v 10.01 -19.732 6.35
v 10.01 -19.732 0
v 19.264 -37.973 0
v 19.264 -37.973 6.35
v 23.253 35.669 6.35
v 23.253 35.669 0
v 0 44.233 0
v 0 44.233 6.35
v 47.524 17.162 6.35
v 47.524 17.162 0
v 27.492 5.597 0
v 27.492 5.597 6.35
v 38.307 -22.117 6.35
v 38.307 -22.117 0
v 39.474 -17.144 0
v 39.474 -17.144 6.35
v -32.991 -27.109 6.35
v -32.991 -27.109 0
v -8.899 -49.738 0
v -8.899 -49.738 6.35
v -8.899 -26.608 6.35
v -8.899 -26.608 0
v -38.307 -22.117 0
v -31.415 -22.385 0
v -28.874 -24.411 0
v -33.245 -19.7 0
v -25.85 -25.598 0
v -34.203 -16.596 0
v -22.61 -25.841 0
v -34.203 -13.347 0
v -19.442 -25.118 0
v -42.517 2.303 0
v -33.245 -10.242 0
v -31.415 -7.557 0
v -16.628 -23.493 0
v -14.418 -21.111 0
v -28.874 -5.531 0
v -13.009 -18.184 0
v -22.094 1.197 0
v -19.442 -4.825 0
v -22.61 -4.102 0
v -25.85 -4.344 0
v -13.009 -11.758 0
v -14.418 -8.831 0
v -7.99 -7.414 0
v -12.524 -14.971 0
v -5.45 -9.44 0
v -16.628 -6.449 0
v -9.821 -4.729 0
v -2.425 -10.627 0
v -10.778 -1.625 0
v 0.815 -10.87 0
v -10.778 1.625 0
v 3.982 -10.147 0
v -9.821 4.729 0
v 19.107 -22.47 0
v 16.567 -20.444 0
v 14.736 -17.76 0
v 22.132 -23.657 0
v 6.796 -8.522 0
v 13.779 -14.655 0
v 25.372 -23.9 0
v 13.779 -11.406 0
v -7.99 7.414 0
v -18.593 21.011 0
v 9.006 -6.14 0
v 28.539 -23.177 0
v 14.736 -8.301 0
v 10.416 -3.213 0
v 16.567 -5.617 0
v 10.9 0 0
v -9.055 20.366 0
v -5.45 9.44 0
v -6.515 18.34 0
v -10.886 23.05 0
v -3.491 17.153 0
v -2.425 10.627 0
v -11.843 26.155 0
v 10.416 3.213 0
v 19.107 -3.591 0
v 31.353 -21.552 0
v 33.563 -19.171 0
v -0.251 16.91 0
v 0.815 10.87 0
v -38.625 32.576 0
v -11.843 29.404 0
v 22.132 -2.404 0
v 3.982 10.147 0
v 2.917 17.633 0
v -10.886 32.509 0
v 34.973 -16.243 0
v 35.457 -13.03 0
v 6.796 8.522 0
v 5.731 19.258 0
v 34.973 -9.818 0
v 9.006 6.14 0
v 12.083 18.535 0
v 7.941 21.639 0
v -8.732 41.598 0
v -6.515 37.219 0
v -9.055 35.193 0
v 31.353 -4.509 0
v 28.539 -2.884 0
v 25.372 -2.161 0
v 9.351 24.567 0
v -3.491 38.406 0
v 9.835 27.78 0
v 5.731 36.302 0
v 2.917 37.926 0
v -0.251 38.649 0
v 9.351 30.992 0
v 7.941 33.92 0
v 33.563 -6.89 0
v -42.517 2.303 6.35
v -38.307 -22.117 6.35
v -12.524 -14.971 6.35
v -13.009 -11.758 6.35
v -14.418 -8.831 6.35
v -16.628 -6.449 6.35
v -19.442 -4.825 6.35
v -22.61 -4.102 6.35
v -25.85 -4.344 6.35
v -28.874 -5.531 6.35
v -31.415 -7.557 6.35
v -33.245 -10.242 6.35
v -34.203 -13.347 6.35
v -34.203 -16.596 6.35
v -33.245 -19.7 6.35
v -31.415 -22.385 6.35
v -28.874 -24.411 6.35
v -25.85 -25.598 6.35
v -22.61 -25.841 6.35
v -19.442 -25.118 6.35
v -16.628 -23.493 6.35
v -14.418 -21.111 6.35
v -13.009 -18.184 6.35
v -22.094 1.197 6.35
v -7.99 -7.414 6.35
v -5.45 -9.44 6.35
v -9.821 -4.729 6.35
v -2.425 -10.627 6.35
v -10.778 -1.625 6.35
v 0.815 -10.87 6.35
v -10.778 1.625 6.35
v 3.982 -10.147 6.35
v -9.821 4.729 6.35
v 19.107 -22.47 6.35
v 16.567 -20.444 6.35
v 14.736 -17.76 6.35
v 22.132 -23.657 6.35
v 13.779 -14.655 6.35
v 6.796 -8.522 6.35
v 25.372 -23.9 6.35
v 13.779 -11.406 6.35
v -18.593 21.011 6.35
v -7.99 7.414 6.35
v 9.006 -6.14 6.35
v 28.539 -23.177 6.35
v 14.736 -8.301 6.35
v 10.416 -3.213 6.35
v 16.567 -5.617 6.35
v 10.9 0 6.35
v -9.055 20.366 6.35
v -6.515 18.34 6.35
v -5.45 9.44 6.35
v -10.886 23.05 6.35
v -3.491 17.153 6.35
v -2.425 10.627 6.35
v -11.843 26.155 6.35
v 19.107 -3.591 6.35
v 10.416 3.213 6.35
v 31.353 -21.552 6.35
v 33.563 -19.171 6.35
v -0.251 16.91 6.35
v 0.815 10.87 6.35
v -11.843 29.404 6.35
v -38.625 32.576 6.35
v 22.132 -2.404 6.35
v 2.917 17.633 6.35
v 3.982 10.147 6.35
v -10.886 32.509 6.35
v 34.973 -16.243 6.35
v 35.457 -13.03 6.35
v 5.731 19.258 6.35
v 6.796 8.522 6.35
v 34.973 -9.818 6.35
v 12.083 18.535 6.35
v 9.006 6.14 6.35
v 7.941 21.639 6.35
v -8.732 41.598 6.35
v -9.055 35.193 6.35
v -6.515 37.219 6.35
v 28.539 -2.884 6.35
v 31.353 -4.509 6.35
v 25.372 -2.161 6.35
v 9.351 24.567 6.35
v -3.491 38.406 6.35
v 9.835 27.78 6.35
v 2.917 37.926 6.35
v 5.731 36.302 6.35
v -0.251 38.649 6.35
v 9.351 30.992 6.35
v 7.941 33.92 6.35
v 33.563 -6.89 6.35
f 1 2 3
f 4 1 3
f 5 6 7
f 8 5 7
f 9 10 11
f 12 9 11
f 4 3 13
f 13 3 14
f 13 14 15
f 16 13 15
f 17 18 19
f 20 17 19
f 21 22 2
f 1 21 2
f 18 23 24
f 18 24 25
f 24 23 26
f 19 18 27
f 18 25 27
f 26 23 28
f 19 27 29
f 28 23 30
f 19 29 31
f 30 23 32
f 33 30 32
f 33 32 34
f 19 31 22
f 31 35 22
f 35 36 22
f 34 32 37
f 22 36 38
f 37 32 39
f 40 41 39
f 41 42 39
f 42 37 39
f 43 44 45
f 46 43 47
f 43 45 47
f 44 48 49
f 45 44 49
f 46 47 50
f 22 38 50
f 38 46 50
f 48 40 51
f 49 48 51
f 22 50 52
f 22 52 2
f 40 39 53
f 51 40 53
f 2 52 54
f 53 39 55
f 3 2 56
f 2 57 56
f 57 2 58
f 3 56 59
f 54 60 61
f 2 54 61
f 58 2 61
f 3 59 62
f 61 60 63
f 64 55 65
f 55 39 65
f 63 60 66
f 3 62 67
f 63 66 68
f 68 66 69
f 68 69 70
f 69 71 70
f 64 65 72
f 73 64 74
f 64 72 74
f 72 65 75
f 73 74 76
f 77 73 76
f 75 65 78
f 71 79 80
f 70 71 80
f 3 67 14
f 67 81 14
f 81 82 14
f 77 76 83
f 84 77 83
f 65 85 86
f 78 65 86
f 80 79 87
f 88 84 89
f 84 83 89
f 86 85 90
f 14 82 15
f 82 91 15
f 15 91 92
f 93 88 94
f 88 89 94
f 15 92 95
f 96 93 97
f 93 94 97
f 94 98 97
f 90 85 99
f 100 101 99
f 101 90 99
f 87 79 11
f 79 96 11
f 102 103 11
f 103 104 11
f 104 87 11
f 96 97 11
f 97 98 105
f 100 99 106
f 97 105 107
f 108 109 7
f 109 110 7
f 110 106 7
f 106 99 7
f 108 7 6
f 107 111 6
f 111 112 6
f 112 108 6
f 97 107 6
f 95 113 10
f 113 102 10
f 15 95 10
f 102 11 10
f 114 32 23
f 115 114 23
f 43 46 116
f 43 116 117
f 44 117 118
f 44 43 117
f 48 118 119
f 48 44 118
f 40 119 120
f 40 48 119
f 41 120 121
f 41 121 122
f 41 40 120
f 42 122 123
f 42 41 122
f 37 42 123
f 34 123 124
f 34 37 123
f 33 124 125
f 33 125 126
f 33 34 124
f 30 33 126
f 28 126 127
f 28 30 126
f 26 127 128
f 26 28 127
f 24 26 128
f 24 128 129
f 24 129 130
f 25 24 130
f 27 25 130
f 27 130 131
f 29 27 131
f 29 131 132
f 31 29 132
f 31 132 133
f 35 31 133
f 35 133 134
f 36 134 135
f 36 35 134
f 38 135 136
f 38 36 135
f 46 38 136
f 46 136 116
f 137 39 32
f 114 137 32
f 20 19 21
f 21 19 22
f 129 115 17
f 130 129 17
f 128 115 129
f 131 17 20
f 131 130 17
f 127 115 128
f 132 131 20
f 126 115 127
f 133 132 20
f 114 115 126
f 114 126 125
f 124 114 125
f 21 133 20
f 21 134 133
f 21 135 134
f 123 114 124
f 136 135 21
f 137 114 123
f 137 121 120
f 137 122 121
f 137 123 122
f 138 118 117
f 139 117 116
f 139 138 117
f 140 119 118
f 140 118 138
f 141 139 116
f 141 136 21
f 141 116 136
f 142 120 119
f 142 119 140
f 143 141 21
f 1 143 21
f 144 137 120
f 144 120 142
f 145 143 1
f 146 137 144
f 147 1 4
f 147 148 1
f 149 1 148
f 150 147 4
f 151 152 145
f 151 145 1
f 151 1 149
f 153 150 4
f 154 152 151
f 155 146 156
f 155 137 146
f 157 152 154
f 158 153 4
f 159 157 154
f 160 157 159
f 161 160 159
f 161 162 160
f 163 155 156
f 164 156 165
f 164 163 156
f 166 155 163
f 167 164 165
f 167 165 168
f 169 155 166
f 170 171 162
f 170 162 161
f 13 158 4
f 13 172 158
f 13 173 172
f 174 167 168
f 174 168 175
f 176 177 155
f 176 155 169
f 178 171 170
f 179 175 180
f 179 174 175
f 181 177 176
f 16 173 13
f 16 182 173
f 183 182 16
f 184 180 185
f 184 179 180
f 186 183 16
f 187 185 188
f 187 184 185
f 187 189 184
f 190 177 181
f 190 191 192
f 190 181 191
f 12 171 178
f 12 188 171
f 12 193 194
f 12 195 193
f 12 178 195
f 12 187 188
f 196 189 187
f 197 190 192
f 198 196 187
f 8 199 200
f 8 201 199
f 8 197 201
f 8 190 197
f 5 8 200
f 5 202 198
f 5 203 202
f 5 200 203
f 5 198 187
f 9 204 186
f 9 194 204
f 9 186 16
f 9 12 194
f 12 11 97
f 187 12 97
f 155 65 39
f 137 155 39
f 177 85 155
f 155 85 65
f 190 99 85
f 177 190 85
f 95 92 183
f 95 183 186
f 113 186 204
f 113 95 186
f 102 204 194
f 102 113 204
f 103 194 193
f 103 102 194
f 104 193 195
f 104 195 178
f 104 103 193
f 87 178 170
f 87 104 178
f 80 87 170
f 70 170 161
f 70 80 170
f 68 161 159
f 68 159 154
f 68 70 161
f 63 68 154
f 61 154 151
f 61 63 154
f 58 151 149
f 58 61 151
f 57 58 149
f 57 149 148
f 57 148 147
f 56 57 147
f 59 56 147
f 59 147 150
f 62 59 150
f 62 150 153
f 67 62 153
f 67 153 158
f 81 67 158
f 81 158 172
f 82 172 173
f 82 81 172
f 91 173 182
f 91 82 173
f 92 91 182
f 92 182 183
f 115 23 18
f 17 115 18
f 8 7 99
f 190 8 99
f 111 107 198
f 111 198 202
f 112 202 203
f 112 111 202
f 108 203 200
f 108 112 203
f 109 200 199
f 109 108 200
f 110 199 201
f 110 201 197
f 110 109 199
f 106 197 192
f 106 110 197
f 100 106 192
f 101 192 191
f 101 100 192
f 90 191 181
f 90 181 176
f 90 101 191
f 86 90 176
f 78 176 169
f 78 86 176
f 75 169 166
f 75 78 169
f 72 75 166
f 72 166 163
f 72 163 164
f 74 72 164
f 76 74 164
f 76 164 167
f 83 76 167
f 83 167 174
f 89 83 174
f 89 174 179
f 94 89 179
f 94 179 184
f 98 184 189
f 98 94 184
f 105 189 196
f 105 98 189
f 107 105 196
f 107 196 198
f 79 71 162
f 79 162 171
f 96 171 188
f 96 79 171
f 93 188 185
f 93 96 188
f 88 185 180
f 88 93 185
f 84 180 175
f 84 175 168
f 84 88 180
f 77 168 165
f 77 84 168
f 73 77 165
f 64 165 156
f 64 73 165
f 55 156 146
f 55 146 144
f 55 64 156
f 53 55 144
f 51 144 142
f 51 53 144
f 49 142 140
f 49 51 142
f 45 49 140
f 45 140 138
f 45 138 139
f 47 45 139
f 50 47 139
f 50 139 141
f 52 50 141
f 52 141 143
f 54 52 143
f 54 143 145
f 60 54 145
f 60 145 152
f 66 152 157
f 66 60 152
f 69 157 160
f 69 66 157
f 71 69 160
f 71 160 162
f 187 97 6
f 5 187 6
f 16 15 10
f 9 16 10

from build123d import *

# Parameters (mm, degrees)
F0_R     = 10.9
F1_DEPTH = 6.35


# Not quite as in the source:
# - a length typed as a fraction of an inch, garbled in the dataset ("3 / 203.2 mm" for 3/8 in), is restored


with BuildPart() as f1:
    # F0 (on Top) → F1 (new body)
    with BuildSketch(Plane.XY):
        Polygon((12.0834760459, 18.5353325598), (23.2533272356, 35.6692190058), (0, 44.2333527703), (-8.7317753371, 41.5979945749), (-38.6247036873, 32.5759376999), (-18.593203622, 21.0107457448), (-22.0938068874, 1.1969309419), (-42.51711341, 2.3033626056), (-38.3072071936, -22.1166763852), (-34.5838293668, -25.6138377102), (-32.9914432749, -27.1094772381), (-8.8992377565, -49.7379434568), (-8.8992377565, -26.6075595468), (10.0103308414, -19.7322635017), (19.2637861744, -37.9725816114), (38.3072071936, -22.1166763852), (39.4741488289, -17.1435559367), (39.973217609, -15.0166893646), (47.5239414439, 17.162005757), (27.4924413785, 5.5968138019), align=None)
        with Locations((-23.4244655113, -14.9711193807)):
            Circle(F0_R, mode=Mode.SUBTRACT)
        with Locations((24.5570029423, -13.0304875769)):
            Circle(F0_R, mode=Mode.SUBTRACT)
        Circle(F0_R, mode=Mode.SUBTRACT)
        with Locations((-1.0652008007, 27.7795850807)):
            Circle(F0_R, mode=Mode.SUBTRACT)
    extrude(amount=F1_DEPTH)


solid = f1.part
